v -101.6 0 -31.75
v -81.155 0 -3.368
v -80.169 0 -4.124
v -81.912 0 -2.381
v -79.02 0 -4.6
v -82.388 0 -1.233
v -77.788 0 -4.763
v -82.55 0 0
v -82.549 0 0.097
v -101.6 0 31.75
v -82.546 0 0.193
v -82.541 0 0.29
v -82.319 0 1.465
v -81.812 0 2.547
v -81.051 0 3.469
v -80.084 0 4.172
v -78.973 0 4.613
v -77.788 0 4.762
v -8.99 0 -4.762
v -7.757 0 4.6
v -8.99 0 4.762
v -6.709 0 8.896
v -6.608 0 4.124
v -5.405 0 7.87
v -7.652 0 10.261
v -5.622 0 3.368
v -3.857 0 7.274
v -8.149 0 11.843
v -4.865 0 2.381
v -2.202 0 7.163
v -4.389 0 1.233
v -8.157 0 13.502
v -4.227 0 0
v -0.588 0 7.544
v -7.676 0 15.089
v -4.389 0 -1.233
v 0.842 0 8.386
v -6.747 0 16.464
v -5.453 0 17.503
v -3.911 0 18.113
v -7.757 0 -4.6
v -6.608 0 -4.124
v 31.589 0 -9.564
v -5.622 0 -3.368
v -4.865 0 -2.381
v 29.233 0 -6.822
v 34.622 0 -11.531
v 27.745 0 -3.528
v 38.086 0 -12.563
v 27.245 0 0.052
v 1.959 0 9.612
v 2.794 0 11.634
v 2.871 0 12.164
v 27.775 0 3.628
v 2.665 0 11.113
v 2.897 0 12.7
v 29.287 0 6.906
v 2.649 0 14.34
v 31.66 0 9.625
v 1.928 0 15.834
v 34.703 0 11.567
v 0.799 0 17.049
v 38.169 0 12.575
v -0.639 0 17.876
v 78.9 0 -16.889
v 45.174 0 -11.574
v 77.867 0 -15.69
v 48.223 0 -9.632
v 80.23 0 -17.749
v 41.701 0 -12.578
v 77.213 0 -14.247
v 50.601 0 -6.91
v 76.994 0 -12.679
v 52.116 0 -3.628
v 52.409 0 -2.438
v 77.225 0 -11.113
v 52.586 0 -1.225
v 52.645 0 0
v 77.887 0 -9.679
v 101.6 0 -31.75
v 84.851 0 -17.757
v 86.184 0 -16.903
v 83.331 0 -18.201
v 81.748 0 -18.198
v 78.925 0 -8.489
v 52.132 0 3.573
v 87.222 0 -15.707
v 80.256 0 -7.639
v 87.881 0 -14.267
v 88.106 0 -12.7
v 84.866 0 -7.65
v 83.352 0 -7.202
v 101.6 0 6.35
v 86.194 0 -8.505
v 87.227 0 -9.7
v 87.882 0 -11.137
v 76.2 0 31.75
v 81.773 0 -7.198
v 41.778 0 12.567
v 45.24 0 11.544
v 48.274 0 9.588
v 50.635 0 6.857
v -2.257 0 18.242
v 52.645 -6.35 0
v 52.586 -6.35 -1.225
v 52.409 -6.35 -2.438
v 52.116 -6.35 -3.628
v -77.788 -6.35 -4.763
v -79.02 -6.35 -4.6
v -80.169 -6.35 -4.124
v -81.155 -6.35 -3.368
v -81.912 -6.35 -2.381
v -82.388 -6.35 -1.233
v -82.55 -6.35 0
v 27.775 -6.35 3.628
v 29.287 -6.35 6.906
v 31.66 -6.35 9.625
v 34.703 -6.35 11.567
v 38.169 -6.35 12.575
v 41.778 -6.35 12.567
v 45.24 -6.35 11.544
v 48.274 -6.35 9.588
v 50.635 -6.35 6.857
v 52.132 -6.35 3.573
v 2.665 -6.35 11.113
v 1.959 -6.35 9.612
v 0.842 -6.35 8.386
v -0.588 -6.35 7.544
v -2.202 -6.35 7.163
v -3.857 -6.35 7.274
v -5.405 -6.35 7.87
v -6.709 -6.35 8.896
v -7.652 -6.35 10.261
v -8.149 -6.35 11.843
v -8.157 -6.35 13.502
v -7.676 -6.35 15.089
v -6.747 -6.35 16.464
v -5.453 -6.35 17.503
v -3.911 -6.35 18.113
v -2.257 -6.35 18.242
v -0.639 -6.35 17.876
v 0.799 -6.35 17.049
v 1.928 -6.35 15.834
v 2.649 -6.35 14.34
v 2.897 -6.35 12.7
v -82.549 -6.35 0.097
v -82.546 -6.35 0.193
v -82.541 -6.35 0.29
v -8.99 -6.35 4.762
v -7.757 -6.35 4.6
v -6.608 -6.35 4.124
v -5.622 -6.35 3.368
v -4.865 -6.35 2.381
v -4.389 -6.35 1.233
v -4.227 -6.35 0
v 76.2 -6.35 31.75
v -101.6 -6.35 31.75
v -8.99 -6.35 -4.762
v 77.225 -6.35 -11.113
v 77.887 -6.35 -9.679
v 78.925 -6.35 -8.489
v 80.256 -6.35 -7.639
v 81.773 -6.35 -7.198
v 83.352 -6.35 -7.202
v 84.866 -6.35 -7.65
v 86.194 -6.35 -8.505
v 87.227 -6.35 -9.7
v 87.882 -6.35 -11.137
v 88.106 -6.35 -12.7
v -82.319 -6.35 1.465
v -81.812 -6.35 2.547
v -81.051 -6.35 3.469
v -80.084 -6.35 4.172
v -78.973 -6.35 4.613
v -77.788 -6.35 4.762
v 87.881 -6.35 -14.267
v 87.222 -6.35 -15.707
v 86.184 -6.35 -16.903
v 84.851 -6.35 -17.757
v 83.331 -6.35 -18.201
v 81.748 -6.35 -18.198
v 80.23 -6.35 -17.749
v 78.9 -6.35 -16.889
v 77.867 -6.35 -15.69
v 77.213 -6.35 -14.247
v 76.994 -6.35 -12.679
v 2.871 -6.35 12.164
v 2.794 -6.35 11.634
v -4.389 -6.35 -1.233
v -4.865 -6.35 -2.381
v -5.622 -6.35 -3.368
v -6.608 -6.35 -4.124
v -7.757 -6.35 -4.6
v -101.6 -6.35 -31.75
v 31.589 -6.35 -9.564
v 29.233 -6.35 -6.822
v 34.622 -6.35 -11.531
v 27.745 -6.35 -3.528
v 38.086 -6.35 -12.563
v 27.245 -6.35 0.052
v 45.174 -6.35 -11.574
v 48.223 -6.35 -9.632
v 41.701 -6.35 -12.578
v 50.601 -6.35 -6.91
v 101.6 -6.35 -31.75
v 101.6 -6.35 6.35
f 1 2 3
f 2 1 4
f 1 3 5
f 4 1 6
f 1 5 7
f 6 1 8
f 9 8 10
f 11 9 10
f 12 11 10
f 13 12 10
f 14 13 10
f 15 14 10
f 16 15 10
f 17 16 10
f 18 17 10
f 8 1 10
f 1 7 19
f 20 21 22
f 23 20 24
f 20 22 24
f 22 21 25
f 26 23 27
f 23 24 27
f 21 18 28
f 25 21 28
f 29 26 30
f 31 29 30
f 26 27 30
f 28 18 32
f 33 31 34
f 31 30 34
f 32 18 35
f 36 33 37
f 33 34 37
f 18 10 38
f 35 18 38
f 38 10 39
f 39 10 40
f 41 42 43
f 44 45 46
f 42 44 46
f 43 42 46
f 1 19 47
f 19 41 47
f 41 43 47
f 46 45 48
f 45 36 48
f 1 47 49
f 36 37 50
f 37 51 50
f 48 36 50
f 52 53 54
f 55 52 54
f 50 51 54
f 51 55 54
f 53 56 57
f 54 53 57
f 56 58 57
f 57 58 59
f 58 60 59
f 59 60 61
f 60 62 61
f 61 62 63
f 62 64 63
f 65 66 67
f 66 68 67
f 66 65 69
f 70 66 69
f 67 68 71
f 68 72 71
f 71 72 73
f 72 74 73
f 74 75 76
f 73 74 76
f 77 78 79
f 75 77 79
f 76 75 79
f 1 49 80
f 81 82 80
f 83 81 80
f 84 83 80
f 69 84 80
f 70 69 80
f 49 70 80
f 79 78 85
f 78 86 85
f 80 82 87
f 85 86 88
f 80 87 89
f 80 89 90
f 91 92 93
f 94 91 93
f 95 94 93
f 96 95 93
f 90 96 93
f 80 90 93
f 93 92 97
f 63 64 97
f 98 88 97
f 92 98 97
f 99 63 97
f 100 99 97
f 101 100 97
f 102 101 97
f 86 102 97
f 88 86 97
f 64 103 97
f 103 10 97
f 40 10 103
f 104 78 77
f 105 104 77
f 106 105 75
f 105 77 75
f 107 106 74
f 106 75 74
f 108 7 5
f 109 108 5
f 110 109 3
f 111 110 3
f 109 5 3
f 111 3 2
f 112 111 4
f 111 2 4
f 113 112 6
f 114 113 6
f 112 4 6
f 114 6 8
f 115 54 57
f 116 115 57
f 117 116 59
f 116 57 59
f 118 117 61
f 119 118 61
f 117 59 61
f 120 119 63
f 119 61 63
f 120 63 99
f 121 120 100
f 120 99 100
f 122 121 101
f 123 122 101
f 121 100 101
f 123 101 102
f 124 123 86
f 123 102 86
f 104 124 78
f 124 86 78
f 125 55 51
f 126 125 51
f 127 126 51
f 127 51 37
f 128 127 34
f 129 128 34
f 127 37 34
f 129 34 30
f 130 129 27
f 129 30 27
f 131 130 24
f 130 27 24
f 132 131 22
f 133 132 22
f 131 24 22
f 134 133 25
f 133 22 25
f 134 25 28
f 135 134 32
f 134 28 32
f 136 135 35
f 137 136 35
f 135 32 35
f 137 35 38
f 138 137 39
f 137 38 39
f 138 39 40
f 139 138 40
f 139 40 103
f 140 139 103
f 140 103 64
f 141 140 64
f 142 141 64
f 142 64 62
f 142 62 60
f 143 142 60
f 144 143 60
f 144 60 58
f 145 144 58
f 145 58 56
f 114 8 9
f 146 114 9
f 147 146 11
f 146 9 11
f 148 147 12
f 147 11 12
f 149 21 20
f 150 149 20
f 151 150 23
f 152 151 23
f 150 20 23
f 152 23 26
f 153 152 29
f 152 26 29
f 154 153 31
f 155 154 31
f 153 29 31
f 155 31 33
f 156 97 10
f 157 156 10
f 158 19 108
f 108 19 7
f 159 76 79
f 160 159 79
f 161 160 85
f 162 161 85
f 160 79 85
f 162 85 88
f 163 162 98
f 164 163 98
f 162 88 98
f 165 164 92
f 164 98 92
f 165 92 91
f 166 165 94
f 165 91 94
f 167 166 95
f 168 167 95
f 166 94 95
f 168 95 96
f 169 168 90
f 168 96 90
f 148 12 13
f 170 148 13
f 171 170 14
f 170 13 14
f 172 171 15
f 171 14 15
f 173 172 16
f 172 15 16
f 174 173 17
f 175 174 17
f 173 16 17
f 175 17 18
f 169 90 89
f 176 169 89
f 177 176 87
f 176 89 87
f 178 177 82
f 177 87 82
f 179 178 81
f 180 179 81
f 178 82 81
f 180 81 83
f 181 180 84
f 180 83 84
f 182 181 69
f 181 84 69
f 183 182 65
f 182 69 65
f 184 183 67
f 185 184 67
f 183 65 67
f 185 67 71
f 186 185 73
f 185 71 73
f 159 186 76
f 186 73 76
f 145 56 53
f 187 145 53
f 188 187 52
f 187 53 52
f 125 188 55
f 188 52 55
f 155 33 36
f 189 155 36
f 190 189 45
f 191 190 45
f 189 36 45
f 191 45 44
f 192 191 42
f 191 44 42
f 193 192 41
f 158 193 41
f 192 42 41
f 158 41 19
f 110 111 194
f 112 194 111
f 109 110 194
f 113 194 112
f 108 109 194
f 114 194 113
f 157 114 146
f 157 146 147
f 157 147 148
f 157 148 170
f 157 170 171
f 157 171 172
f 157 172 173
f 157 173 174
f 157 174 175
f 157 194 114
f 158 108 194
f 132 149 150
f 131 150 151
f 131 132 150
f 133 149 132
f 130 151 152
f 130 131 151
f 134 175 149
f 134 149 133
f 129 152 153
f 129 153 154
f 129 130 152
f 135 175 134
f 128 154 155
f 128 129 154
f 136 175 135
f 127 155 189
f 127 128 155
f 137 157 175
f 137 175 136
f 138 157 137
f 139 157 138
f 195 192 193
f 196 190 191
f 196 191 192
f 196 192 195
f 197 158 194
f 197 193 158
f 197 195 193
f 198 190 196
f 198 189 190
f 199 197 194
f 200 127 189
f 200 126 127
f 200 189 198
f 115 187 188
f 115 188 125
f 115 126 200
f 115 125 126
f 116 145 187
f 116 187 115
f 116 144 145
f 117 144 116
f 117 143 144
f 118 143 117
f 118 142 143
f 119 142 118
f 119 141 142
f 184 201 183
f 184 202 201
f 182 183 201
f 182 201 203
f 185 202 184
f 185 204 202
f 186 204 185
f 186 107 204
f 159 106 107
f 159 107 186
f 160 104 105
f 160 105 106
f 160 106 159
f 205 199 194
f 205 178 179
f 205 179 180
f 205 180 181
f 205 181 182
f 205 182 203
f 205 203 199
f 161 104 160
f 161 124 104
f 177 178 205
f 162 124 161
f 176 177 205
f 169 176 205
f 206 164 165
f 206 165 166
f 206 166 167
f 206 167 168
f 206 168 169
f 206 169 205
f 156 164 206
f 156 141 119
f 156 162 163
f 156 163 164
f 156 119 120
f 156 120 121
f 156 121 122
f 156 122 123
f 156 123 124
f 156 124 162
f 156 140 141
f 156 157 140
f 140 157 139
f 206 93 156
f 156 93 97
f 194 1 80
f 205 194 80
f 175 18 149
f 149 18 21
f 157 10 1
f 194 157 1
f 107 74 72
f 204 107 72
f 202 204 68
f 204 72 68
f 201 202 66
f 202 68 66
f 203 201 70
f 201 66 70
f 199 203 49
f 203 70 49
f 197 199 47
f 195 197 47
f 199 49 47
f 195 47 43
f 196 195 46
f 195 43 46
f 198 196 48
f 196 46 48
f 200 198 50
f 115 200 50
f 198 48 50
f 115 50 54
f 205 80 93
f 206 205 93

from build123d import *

# Parameters (mm, degrees)
F1_DEPTH = 6.35


with BuildPart() as f1:
    # F0 (on Front) → F1 (new body)
    with BuildSketch(Plane.XZ):
        Polygon((-101.6, -31.75), (101.6, -31.75), (101.6, 6.35), (76.2, 31.75), (-101.6, 31.75), align=None)
        with BuildLine():
            ThreePointArc((77.225286, -11.11276), (83.352019, -7.201939), (88.10625, -12.7))
            ThreePointArc((88.10625, -12.7), (81.747981, -18.198061), (77.225286, -11.11276))
        make_face(mode=Mode.SUBTRACT)
        with BuildLine():
            ThreePointArc((-82.541162, 0.290002), (-81.050955, 3.468612), (-77.7875, 4.7625))
            Line((-77.7875, 4.7625), (-8.989503, 4.7625))
            ThreePointArc((-8.989503, 4.7625), (-5.621907, 3.367596), (-4.227003, 0))
            ThreePointArc((-4.227003, 0), (-5.621907, -3.367596), (-8.989503, -4.7625))
            Line((-8.989503, -4.7625), (-77.7875, -4.7625))
            ThreePointArc((-77.7875, -4.7625), (-81.155096, -3.367596), (-82.55, 0))
            ThreePointArc((-82.55, 0), (-82.54779, 0.145068), (-82.541162, 0.290002))
        make_face(mode=Mode.SUBTRACT)
        with BuildLine():
            ThreePointArc((2.89687, 12.7), (2.838681, 11.897981), (2.665334, 11.11276))
            ThreePointArc((2.665334, 11.11276), (-8.157441, 13.502019), (2.89687, 12.7))
        make_face(mode=Mode.SUBTRACT)
        with BuildLine():
            ThreePointArc((52.64531, 0), (52.512307, -1.833187), (52.116086, -3.627977))
            ThreePointArc((52.116086, -3.627977), (36.317333, -12.170776), (27.774534, 3.627977))
            ThreePointArc((27.774534, 3.627977), (41.778497, 12.566997), (52.64531, 0))
        make_face(mode=Mode.SUBTRACT)
    extrude(amount=F1_DEPTH)


solid = f1.part
